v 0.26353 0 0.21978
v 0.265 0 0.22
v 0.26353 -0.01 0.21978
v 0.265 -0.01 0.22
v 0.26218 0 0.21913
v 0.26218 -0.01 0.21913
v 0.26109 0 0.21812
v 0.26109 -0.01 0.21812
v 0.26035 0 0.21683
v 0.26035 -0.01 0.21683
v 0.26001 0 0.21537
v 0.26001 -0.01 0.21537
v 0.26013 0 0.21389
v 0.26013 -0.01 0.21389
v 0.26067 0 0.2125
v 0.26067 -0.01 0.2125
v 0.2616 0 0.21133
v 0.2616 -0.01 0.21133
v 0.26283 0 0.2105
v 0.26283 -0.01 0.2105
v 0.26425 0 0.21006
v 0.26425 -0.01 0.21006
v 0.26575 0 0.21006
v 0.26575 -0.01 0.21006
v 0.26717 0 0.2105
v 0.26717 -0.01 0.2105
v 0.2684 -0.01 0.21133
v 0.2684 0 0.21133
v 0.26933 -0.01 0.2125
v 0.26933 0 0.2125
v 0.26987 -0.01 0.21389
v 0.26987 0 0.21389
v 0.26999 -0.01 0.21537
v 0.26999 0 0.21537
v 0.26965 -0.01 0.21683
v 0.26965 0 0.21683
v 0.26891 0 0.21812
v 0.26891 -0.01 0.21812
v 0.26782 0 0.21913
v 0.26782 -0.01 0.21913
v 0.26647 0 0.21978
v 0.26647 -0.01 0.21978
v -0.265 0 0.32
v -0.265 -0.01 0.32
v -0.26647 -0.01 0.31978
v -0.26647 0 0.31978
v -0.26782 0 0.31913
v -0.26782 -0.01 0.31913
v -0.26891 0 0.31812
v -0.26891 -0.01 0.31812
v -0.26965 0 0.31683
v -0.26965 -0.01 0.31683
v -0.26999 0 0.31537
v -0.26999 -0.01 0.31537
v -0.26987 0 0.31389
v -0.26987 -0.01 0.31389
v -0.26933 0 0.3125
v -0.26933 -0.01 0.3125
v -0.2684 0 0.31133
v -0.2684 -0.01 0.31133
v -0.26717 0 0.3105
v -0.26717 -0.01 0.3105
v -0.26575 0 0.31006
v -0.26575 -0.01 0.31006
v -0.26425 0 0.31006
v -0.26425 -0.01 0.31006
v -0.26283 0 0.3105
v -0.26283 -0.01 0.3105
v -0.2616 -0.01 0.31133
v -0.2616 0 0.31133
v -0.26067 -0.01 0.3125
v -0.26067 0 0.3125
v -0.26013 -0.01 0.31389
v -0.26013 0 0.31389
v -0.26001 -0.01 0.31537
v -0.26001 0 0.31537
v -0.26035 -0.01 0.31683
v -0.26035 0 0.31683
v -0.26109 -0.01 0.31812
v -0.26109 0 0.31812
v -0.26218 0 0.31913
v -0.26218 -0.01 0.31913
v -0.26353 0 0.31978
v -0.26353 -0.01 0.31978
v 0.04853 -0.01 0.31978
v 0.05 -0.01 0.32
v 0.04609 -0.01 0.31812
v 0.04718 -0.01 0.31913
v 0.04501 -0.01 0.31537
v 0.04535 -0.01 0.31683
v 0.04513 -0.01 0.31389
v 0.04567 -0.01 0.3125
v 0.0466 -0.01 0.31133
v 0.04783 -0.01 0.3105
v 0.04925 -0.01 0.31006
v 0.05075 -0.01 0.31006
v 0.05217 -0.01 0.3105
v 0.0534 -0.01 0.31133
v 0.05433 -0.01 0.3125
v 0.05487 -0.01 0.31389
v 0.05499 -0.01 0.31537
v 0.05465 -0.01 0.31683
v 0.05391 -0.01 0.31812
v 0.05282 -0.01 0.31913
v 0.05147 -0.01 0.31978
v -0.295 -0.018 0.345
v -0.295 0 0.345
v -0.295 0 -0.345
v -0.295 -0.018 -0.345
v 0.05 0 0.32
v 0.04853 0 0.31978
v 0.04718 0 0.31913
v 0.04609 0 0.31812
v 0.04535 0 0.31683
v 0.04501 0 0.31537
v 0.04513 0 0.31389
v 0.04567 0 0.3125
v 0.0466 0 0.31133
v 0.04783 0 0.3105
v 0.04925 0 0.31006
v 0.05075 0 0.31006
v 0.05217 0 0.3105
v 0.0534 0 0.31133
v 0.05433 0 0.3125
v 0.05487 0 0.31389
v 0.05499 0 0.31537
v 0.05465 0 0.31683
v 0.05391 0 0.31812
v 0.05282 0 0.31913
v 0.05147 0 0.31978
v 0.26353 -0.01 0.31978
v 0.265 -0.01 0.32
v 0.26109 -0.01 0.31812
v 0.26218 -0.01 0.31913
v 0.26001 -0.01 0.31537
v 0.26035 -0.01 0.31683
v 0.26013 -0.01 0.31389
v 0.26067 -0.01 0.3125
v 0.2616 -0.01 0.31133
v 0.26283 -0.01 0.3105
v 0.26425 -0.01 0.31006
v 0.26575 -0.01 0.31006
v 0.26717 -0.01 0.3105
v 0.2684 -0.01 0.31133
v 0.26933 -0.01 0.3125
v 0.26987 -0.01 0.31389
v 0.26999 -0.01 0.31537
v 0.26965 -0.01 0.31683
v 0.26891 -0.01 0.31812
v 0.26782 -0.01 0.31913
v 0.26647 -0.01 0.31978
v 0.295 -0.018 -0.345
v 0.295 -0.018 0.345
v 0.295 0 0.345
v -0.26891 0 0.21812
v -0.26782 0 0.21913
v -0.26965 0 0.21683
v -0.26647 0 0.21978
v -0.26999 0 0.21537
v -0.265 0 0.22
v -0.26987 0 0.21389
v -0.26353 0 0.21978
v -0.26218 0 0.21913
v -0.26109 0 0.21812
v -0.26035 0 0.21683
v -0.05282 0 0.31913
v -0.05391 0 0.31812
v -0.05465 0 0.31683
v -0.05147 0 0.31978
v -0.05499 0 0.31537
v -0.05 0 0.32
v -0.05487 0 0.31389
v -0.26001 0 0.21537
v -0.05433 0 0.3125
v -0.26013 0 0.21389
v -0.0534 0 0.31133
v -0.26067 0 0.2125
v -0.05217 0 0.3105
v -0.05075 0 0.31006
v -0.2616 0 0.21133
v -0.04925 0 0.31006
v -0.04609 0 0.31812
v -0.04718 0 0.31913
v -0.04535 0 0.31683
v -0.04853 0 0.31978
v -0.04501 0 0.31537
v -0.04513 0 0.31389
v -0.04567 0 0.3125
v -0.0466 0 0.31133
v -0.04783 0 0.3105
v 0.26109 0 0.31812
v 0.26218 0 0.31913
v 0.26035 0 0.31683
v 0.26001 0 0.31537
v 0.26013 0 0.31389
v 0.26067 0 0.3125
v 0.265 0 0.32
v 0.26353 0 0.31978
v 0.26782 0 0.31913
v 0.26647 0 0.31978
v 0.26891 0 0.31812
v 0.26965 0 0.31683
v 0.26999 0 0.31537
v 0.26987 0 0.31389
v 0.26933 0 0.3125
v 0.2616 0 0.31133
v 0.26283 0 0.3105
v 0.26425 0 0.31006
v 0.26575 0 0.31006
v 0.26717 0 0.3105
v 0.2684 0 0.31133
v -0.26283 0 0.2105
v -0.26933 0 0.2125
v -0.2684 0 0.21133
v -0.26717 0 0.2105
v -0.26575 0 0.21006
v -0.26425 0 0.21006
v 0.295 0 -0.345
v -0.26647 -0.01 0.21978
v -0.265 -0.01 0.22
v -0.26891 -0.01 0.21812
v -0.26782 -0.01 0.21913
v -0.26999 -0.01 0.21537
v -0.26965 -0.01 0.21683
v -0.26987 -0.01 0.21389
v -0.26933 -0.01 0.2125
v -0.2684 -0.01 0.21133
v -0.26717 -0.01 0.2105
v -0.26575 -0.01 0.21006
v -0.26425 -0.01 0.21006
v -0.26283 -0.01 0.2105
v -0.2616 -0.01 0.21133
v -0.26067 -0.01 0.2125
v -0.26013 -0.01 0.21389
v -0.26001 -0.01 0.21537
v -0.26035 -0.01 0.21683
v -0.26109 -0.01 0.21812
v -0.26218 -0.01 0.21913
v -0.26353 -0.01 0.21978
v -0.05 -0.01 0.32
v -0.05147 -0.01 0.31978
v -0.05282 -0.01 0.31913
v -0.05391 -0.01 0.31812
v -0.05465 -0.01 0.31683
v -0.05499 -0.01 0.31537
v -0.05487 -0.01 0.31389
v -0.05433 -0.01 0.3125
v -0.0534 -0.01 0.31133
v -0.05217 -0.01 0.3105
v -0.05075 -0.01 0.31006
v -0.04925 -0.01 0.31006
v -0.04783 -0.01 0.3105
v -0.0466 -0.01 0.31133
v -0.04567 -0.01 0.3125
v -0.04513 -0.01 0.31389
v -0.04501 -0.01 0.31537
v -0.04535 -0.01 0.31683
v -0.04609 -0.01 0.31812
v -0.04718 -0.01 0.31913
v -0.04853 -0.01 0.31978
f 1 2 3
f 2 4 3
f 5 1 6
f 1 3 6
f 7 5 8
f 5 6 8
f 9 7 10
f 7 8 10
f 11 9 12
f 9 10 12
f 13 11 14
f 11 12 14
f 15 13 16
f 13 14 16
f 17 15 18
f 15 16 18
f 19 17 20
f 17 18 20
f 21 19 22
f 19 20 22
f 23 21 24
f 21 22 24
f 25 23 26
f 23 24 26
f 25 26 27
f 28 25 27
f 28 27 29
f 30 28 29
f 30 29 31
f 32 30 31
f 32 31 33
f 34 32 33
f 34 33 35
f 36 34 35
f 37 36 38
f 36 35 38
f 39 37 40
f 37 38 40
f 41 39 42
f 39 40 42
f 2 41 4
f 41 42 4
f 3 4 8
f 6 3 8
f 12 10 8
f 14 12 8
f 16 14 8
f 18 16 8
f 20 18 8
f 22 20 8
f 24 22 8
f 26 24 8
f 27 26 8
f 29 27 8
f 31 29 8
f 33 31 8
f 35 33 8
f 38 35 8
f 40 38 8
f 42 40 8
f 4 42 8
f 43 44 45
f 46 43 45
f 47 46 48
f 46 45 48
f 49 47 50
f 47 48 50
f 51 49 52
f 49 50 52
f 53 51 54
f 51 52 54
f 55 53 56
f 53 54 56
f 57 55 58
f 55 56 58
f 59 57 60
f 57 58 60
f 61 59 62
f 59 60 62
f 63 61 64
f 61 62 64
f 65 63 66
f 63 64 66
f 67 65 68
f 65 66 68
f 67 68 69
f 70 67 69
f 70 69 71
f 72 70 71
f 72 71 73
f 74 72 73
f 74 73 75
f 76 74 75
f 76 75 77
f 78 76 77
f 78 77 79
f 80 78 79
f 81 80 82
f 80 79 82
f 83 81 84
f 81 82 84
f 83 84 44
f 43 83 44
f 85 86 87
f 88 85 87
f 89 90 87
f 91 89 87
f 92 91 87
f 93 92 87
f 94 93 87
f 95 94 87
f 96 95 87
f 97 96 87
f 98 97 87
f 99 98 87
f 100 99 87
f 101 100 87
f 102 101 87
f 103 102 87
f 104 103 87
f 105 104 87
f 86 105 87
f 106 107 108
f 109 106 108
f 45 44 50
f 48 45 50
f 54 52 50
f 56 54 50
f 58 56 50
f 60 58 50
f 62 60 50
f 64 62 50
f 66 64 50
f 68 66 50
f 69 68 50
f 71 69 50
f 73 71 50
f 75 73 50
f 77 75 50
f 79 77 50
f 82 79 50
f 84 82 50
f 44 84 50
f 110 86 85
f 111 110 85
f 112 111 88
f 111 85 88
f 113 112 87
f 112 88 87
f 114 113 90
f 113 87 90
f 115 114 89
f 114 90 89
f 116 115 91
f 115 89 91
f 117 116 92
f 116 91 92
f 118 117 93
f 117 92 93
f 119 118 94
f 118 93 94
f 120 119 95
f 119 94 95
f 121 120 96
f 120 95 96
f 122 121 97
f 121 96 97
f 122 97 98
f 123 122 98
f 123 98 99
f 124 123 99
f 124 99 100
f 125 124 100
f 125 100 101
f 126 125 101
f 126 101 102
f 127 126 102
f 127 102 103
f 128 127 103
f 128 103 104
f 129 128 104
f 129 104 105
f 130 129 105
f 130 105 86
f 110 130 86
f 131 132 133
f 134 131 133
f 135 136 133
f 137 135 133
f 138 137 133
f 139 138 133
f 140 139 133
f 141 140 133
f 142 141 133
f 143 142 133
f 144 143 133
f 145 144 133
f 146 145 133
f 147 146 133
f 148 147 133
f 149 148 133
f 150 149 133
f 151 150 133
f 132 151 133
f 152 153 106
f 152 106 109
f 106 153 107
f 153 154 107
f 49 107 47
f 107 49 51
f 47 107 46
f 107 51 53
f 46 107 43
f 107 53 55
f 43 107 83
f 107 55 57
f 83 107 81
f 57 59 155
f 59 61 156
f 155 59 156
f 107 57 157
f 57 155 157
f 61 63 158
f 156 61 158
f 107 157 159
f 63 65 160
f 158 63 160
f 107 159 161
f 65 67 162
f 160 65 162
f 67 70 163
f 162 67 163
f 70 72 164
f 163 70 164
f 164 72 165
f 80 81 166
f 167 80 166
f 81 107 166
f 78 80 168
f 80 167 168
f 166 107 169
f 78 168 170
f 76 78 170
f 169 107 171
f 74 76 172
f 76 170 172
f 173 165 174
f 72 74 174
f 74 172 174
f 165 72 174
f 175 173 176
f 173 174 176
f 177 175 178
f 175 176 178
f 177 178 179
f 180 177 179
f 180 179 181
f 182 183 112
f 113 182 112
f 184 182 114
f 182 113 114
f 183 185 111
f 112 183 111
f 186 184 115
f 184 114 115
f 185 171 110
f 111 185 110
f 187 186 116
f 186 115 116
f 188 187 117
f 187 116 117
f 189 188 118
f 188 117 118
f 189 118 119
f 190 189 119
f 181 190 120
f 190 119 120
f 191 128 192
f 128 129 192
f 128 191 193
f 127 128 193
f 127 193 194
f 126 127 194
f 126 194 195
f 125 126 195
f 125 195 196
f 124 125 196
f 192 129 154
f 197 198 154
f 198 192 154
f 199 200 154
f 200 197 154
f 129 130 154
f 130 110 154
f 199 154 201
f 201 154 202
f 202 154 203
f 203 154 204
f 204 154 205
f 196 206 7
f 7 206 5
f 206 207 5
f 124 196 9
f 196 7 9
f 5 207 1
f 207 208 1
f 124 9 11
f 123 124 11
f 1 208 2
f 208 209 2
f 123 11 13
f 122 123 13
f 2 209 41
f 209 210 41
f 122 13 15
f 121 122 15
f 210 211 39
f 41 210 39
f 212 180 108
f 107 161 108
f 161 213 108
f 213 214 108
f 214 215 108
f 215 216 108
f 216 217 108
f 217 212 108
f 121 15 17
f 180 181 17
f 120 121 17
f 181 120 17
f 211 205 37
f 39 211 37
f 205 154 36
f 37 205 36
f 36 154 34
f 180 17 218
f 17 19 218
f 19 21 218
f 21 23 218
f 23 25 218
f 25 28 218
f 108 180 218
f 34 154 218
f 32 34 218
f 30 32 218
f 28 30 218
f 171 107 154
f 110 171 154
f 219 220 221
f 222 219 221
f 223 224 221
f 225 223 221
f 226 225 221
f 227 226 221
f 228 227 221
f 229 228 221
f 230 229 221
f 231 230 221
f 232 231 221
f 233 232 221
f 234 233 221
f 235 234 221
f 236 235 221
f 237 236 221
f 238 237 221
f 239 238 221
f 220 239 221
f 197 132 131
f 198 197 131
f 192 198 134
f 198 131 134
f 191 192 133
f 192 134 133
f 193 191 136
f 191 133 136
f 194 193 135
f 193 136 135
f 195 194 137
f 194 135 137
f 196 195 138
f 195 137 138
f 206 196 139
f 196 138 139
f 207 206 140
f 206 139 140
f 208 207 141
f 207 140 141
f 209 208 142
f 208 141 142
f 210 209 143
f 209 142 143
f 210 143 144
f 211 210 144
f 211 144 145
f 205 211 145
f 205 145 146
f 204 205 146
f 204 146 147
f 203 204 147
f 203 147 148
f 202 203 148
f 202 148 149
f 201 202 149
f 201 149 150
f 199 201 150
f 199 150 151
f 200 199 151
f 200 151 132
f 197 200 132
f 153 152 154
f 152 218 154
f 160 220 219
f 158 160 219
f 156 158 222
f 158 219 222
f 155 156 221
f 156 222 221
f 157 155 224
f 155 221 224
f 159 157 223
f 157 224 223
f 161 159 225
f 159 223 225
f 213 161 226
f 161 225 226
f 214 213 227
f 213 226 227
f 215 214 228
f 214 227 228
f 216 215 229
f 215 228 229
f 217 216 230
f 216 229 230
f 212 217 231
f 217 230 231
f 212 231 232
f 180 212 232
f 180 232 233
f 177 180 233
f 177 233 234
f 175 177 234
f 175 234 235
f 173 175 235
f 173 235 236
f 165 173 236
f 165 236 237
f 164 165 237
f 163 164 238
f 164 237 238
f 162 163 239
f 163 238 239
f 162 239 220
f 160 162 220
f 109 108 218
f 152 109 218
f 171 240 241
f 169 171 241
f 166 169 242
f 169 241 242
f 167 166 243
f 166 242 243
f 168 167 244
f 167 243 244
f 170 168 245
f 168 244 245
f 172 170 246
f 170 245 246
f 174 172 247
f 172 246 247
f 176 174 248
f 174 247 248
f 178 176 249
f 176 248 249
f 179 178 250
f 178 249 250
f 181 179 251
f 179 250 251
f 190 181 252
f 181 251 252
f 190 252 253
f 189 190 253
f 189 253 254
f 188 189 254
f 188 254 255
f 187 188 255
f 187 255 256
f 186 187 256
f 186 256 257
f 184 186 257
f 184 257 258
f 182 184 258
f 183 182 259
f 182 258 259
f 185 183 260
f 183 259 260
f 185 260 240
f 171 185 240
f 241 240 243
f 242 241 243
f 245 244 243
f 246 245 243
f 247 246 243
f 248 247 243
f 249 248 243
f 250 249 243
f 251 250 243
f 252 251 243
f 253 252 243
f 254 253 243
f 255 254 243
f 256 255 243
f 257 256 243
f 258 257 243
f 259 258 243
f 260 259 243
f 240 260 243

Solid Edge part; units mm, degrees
sketch "Sketch1" plane through (0, 0, 0) normal (0, -1, 0) x (1, 0, 0)
  line L0 (-0.295, -0.345) -> (0.295, -0.345)
  line L1 (0.295, -0.345) -> (0.295, 0.345)
  line L2 (0.295, 0.345) -> (-0.295, 0.345)
  line L3 (-0.295, 0.345) -> (-0.295, -0.345)
  dimension "D1" = 0.69
  dimension "D2" = 0.59
extrude "Protrusion1" add sketch "Sketch1" along normal blind 0.018
hole "Bohrung_1" at (-0.05, 0, 0.315) direction (0, -1, 0) diameter 0.01 depth 0.01
hole "Hole1" at (0.05, 0, 0.315) direction (0, -1, 0) diameter 0.01 depth 0.01
hole "Hole2" at (0.265, 0, 0.315) direction (0, -1, 0) diameter 0.01 depth 0.01
hole "Hole3" at (0.265, 0, 0.215) direction (0, -1, 0) diameter 0.01 depth 0.01
hole "Hole4" at (-0.265, 0, 0.215) direction (0, -1, 0) diameter 0.01 depth 0.01
hole "Hole5" at (-0.265, 0, 0.315) direction (0, -1, 0) diameter 0.01 depth 0.01
